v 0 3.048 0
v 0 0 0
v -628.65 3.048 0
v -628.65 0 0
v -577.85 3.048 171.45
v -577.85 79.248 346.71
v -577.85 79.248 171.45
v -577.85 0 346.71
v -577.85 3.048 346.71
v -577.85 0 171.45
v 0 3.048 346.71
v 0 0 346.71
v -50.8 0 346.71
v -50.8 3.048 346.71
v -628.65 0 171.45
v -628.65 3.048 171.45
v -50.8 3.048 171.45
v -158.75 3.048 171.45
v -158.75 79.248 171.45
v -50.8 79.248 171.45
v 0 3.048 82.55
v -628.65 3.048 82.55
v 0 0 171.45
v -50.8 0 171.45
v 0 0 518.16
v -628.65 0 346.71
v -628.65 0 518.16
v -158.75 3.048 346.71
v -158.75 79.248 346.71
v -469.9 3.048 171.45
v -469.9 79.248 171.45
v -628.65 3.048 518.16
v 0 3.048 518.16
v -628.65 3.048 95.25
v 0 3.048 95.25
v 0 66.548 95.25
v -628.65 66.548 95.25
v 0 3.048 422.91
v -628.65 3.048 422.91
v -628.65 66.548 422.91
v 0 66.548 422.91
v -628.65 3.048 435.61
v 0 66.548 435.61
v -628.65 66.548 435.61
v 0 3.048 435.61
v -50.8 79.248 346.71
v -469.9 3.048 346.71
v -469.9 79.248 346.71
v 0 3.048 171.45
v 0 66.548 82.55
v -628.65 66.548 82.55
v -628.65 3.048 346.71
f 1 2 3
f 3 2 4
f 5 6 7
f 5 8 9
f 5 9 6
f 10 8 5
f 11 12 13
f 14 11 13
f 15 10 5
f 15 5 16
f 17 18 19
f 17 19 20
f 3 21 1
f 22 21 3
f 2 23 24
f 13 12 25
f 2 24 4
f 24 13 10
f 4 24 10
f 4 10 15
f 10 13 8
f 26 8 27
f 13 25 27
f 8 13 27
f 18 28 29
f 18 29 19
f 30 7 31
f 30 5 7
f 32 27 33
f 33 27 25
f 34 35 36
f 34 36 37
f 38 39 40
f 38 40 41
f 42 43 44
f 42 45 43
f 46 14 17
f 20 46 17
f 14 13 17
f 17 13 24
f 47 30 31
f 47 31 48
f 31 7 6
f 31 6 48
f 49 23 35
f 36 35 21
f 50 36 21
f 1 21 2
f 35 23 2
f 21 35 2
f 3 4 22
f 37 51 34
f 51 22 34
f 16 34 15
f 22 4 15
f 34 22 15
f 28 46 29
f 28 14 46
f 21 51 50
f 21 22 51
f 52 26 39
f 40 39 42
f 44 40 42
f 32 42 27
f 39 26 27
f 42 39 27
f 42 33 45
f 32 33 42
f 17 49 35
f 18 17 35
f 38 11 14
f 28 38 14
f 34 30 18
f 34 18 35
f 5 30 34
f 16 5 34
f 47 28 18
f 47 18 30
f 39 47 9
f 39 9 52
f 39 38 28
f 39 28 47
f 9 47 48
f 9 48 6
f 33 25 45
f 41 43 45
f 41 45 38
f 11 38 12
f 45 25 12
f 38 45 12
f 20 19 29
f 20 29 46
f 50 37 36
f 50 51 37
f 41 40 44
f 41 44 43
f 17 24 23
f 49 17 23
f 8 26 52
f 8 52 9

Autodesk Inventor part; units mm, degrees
ref_plane "YZ Plane" through (0, 0, 0) normal (1, 0, 0) x (0, 1, 0)
ref_plane "XZ Plane" through (0, 0, 0) normal (0, 1, 0) x (-1, 0, 0)
ref_plane "XY Plane" through (0, 0, 0) normal (0, 0, 1) x (1, 0, 0)
sketch "Sketch1" plane through (0, 0, 0) normal (0, 1, 0) x (-1, 0, 0)
  line L0 (0, 0) -> (628.65, 0)
  line L1 (628.65, 0) -> (628.65, 518.16)
  line L2 (628.65, 518.16) -> (0, 518.16)
  line L3 (0, 518.16) -> (0, 0)
  line L4 (0, 346.71) -> (50.8, 346.71)
  line L5 (50.8, 346.71) -> (50.8, 171.45)
  line L6 (50.8, 171.45) -> (0, 171.45)
  line L7 (0, 171.45) -> (0, 346.71)
  line L8 (628.65, 346.71) -> (577.85, 346.71)
  line L9 (577.85, 346.71) -> (577.85, 171.45)
  line L10 (577.85, 171.45) -> (628.65, 171.45)
  line L11 (628.65, 171.45) -> (628.65, 346.71)
  dimension "d0" = 628.65
  dimension "d1" = 518.16
  dimension "d2" = 50.8
  dimension "d3" = 50.8
  dimension "d4" = 171.45
  dimension "d5" = 171.45
  dimension "d6" = 171.45
  dimension "d7" = 171.45
extrude "Extrusion1" add sketch "Sketch1" along normal blind 3.048 contours L3 L6 L5 L4 L2 L1 L8 L9 L10 L0
sketch "Sketch2" plane through (0, 3.048, 0) normal (0, 1, 0) x (1, 0, 0)
  line L0 (-577.85, -171.45) -> (-469.9, -171.45)
  line L1 (-469.9, -171.45) -> (-469.9, -346.71)
  line L2 (-469.9, -346.71) -> (-577.85, -346.71)
  line L3 (-577.85, -346.71) -> (-577.85, -171.45)
  line L4 (-50.8, -346.71) -> (-158.75, -346.71)
  line L5 (-158.75, -346.71) -> (-158.75, -171.45)
  line L6 (-158.75, -171.45) -> (-50.8, -171.45)
  line L7 (-50.8, -171.45) -> (-50.8, -346.71)
  dimension "d10" = 107.95
  dimension "d11" = 107.95
extrude "Extrusion3" add sketch "Sketch2" along normal blind 76.2
sketch "Sketch3" plane through (0, 3.048, 0) normal (0, 1, 0) x (1, 0, 0)
  line L0 (-628.65, -346.71) -> (-628.65, -518.16) projected
  line L1 (0, -518.16) -> (0, -346.71) projected
  line L2 (-50.8, -346.71) -> (-158.75, -346.71) projected
  line L3 (0, -171.45) -> (0, 0) projected
  line L4 (-628.65, 0) -> (-628.65, -171.45) projected
  line L5 (-577.85, -171.45) -> (-469.9, -171.45) projected
  line L6 (-628.65, -422.91) -> (0, -422.91)
  line L7 (0, -422.91) -> (0, -435.61)
  line L8 (0, -435.61) -> (-628.65, -435.61)
  line L9 (-628.65, -435.61) -> (-628.65, -422.91)
  line L10 (-628.65, -82.55) -> (0, -82.55)
  line L11 (0, -82.55) -> (0, -95.25)
  line L12 (0, -95.25) -> (-628.65, -95.25)
  line L13 (-628.65, -95.25) -> (-628.65, -82.55)
  dimension "d16" = 12.7
  dimension "d17" = 12.7
  dimension "d18" = 76.2
  dimension "d19" = 76.2
extrude "Extrusion4" add sketch "Sketch3" along normal blind 63.5
equation "\"d3\" = d2"
equation "\"d5\" = d4"
equation "\"d6\" = d4"
equation "\"d7\" = d4"
properties part number "eboard"
